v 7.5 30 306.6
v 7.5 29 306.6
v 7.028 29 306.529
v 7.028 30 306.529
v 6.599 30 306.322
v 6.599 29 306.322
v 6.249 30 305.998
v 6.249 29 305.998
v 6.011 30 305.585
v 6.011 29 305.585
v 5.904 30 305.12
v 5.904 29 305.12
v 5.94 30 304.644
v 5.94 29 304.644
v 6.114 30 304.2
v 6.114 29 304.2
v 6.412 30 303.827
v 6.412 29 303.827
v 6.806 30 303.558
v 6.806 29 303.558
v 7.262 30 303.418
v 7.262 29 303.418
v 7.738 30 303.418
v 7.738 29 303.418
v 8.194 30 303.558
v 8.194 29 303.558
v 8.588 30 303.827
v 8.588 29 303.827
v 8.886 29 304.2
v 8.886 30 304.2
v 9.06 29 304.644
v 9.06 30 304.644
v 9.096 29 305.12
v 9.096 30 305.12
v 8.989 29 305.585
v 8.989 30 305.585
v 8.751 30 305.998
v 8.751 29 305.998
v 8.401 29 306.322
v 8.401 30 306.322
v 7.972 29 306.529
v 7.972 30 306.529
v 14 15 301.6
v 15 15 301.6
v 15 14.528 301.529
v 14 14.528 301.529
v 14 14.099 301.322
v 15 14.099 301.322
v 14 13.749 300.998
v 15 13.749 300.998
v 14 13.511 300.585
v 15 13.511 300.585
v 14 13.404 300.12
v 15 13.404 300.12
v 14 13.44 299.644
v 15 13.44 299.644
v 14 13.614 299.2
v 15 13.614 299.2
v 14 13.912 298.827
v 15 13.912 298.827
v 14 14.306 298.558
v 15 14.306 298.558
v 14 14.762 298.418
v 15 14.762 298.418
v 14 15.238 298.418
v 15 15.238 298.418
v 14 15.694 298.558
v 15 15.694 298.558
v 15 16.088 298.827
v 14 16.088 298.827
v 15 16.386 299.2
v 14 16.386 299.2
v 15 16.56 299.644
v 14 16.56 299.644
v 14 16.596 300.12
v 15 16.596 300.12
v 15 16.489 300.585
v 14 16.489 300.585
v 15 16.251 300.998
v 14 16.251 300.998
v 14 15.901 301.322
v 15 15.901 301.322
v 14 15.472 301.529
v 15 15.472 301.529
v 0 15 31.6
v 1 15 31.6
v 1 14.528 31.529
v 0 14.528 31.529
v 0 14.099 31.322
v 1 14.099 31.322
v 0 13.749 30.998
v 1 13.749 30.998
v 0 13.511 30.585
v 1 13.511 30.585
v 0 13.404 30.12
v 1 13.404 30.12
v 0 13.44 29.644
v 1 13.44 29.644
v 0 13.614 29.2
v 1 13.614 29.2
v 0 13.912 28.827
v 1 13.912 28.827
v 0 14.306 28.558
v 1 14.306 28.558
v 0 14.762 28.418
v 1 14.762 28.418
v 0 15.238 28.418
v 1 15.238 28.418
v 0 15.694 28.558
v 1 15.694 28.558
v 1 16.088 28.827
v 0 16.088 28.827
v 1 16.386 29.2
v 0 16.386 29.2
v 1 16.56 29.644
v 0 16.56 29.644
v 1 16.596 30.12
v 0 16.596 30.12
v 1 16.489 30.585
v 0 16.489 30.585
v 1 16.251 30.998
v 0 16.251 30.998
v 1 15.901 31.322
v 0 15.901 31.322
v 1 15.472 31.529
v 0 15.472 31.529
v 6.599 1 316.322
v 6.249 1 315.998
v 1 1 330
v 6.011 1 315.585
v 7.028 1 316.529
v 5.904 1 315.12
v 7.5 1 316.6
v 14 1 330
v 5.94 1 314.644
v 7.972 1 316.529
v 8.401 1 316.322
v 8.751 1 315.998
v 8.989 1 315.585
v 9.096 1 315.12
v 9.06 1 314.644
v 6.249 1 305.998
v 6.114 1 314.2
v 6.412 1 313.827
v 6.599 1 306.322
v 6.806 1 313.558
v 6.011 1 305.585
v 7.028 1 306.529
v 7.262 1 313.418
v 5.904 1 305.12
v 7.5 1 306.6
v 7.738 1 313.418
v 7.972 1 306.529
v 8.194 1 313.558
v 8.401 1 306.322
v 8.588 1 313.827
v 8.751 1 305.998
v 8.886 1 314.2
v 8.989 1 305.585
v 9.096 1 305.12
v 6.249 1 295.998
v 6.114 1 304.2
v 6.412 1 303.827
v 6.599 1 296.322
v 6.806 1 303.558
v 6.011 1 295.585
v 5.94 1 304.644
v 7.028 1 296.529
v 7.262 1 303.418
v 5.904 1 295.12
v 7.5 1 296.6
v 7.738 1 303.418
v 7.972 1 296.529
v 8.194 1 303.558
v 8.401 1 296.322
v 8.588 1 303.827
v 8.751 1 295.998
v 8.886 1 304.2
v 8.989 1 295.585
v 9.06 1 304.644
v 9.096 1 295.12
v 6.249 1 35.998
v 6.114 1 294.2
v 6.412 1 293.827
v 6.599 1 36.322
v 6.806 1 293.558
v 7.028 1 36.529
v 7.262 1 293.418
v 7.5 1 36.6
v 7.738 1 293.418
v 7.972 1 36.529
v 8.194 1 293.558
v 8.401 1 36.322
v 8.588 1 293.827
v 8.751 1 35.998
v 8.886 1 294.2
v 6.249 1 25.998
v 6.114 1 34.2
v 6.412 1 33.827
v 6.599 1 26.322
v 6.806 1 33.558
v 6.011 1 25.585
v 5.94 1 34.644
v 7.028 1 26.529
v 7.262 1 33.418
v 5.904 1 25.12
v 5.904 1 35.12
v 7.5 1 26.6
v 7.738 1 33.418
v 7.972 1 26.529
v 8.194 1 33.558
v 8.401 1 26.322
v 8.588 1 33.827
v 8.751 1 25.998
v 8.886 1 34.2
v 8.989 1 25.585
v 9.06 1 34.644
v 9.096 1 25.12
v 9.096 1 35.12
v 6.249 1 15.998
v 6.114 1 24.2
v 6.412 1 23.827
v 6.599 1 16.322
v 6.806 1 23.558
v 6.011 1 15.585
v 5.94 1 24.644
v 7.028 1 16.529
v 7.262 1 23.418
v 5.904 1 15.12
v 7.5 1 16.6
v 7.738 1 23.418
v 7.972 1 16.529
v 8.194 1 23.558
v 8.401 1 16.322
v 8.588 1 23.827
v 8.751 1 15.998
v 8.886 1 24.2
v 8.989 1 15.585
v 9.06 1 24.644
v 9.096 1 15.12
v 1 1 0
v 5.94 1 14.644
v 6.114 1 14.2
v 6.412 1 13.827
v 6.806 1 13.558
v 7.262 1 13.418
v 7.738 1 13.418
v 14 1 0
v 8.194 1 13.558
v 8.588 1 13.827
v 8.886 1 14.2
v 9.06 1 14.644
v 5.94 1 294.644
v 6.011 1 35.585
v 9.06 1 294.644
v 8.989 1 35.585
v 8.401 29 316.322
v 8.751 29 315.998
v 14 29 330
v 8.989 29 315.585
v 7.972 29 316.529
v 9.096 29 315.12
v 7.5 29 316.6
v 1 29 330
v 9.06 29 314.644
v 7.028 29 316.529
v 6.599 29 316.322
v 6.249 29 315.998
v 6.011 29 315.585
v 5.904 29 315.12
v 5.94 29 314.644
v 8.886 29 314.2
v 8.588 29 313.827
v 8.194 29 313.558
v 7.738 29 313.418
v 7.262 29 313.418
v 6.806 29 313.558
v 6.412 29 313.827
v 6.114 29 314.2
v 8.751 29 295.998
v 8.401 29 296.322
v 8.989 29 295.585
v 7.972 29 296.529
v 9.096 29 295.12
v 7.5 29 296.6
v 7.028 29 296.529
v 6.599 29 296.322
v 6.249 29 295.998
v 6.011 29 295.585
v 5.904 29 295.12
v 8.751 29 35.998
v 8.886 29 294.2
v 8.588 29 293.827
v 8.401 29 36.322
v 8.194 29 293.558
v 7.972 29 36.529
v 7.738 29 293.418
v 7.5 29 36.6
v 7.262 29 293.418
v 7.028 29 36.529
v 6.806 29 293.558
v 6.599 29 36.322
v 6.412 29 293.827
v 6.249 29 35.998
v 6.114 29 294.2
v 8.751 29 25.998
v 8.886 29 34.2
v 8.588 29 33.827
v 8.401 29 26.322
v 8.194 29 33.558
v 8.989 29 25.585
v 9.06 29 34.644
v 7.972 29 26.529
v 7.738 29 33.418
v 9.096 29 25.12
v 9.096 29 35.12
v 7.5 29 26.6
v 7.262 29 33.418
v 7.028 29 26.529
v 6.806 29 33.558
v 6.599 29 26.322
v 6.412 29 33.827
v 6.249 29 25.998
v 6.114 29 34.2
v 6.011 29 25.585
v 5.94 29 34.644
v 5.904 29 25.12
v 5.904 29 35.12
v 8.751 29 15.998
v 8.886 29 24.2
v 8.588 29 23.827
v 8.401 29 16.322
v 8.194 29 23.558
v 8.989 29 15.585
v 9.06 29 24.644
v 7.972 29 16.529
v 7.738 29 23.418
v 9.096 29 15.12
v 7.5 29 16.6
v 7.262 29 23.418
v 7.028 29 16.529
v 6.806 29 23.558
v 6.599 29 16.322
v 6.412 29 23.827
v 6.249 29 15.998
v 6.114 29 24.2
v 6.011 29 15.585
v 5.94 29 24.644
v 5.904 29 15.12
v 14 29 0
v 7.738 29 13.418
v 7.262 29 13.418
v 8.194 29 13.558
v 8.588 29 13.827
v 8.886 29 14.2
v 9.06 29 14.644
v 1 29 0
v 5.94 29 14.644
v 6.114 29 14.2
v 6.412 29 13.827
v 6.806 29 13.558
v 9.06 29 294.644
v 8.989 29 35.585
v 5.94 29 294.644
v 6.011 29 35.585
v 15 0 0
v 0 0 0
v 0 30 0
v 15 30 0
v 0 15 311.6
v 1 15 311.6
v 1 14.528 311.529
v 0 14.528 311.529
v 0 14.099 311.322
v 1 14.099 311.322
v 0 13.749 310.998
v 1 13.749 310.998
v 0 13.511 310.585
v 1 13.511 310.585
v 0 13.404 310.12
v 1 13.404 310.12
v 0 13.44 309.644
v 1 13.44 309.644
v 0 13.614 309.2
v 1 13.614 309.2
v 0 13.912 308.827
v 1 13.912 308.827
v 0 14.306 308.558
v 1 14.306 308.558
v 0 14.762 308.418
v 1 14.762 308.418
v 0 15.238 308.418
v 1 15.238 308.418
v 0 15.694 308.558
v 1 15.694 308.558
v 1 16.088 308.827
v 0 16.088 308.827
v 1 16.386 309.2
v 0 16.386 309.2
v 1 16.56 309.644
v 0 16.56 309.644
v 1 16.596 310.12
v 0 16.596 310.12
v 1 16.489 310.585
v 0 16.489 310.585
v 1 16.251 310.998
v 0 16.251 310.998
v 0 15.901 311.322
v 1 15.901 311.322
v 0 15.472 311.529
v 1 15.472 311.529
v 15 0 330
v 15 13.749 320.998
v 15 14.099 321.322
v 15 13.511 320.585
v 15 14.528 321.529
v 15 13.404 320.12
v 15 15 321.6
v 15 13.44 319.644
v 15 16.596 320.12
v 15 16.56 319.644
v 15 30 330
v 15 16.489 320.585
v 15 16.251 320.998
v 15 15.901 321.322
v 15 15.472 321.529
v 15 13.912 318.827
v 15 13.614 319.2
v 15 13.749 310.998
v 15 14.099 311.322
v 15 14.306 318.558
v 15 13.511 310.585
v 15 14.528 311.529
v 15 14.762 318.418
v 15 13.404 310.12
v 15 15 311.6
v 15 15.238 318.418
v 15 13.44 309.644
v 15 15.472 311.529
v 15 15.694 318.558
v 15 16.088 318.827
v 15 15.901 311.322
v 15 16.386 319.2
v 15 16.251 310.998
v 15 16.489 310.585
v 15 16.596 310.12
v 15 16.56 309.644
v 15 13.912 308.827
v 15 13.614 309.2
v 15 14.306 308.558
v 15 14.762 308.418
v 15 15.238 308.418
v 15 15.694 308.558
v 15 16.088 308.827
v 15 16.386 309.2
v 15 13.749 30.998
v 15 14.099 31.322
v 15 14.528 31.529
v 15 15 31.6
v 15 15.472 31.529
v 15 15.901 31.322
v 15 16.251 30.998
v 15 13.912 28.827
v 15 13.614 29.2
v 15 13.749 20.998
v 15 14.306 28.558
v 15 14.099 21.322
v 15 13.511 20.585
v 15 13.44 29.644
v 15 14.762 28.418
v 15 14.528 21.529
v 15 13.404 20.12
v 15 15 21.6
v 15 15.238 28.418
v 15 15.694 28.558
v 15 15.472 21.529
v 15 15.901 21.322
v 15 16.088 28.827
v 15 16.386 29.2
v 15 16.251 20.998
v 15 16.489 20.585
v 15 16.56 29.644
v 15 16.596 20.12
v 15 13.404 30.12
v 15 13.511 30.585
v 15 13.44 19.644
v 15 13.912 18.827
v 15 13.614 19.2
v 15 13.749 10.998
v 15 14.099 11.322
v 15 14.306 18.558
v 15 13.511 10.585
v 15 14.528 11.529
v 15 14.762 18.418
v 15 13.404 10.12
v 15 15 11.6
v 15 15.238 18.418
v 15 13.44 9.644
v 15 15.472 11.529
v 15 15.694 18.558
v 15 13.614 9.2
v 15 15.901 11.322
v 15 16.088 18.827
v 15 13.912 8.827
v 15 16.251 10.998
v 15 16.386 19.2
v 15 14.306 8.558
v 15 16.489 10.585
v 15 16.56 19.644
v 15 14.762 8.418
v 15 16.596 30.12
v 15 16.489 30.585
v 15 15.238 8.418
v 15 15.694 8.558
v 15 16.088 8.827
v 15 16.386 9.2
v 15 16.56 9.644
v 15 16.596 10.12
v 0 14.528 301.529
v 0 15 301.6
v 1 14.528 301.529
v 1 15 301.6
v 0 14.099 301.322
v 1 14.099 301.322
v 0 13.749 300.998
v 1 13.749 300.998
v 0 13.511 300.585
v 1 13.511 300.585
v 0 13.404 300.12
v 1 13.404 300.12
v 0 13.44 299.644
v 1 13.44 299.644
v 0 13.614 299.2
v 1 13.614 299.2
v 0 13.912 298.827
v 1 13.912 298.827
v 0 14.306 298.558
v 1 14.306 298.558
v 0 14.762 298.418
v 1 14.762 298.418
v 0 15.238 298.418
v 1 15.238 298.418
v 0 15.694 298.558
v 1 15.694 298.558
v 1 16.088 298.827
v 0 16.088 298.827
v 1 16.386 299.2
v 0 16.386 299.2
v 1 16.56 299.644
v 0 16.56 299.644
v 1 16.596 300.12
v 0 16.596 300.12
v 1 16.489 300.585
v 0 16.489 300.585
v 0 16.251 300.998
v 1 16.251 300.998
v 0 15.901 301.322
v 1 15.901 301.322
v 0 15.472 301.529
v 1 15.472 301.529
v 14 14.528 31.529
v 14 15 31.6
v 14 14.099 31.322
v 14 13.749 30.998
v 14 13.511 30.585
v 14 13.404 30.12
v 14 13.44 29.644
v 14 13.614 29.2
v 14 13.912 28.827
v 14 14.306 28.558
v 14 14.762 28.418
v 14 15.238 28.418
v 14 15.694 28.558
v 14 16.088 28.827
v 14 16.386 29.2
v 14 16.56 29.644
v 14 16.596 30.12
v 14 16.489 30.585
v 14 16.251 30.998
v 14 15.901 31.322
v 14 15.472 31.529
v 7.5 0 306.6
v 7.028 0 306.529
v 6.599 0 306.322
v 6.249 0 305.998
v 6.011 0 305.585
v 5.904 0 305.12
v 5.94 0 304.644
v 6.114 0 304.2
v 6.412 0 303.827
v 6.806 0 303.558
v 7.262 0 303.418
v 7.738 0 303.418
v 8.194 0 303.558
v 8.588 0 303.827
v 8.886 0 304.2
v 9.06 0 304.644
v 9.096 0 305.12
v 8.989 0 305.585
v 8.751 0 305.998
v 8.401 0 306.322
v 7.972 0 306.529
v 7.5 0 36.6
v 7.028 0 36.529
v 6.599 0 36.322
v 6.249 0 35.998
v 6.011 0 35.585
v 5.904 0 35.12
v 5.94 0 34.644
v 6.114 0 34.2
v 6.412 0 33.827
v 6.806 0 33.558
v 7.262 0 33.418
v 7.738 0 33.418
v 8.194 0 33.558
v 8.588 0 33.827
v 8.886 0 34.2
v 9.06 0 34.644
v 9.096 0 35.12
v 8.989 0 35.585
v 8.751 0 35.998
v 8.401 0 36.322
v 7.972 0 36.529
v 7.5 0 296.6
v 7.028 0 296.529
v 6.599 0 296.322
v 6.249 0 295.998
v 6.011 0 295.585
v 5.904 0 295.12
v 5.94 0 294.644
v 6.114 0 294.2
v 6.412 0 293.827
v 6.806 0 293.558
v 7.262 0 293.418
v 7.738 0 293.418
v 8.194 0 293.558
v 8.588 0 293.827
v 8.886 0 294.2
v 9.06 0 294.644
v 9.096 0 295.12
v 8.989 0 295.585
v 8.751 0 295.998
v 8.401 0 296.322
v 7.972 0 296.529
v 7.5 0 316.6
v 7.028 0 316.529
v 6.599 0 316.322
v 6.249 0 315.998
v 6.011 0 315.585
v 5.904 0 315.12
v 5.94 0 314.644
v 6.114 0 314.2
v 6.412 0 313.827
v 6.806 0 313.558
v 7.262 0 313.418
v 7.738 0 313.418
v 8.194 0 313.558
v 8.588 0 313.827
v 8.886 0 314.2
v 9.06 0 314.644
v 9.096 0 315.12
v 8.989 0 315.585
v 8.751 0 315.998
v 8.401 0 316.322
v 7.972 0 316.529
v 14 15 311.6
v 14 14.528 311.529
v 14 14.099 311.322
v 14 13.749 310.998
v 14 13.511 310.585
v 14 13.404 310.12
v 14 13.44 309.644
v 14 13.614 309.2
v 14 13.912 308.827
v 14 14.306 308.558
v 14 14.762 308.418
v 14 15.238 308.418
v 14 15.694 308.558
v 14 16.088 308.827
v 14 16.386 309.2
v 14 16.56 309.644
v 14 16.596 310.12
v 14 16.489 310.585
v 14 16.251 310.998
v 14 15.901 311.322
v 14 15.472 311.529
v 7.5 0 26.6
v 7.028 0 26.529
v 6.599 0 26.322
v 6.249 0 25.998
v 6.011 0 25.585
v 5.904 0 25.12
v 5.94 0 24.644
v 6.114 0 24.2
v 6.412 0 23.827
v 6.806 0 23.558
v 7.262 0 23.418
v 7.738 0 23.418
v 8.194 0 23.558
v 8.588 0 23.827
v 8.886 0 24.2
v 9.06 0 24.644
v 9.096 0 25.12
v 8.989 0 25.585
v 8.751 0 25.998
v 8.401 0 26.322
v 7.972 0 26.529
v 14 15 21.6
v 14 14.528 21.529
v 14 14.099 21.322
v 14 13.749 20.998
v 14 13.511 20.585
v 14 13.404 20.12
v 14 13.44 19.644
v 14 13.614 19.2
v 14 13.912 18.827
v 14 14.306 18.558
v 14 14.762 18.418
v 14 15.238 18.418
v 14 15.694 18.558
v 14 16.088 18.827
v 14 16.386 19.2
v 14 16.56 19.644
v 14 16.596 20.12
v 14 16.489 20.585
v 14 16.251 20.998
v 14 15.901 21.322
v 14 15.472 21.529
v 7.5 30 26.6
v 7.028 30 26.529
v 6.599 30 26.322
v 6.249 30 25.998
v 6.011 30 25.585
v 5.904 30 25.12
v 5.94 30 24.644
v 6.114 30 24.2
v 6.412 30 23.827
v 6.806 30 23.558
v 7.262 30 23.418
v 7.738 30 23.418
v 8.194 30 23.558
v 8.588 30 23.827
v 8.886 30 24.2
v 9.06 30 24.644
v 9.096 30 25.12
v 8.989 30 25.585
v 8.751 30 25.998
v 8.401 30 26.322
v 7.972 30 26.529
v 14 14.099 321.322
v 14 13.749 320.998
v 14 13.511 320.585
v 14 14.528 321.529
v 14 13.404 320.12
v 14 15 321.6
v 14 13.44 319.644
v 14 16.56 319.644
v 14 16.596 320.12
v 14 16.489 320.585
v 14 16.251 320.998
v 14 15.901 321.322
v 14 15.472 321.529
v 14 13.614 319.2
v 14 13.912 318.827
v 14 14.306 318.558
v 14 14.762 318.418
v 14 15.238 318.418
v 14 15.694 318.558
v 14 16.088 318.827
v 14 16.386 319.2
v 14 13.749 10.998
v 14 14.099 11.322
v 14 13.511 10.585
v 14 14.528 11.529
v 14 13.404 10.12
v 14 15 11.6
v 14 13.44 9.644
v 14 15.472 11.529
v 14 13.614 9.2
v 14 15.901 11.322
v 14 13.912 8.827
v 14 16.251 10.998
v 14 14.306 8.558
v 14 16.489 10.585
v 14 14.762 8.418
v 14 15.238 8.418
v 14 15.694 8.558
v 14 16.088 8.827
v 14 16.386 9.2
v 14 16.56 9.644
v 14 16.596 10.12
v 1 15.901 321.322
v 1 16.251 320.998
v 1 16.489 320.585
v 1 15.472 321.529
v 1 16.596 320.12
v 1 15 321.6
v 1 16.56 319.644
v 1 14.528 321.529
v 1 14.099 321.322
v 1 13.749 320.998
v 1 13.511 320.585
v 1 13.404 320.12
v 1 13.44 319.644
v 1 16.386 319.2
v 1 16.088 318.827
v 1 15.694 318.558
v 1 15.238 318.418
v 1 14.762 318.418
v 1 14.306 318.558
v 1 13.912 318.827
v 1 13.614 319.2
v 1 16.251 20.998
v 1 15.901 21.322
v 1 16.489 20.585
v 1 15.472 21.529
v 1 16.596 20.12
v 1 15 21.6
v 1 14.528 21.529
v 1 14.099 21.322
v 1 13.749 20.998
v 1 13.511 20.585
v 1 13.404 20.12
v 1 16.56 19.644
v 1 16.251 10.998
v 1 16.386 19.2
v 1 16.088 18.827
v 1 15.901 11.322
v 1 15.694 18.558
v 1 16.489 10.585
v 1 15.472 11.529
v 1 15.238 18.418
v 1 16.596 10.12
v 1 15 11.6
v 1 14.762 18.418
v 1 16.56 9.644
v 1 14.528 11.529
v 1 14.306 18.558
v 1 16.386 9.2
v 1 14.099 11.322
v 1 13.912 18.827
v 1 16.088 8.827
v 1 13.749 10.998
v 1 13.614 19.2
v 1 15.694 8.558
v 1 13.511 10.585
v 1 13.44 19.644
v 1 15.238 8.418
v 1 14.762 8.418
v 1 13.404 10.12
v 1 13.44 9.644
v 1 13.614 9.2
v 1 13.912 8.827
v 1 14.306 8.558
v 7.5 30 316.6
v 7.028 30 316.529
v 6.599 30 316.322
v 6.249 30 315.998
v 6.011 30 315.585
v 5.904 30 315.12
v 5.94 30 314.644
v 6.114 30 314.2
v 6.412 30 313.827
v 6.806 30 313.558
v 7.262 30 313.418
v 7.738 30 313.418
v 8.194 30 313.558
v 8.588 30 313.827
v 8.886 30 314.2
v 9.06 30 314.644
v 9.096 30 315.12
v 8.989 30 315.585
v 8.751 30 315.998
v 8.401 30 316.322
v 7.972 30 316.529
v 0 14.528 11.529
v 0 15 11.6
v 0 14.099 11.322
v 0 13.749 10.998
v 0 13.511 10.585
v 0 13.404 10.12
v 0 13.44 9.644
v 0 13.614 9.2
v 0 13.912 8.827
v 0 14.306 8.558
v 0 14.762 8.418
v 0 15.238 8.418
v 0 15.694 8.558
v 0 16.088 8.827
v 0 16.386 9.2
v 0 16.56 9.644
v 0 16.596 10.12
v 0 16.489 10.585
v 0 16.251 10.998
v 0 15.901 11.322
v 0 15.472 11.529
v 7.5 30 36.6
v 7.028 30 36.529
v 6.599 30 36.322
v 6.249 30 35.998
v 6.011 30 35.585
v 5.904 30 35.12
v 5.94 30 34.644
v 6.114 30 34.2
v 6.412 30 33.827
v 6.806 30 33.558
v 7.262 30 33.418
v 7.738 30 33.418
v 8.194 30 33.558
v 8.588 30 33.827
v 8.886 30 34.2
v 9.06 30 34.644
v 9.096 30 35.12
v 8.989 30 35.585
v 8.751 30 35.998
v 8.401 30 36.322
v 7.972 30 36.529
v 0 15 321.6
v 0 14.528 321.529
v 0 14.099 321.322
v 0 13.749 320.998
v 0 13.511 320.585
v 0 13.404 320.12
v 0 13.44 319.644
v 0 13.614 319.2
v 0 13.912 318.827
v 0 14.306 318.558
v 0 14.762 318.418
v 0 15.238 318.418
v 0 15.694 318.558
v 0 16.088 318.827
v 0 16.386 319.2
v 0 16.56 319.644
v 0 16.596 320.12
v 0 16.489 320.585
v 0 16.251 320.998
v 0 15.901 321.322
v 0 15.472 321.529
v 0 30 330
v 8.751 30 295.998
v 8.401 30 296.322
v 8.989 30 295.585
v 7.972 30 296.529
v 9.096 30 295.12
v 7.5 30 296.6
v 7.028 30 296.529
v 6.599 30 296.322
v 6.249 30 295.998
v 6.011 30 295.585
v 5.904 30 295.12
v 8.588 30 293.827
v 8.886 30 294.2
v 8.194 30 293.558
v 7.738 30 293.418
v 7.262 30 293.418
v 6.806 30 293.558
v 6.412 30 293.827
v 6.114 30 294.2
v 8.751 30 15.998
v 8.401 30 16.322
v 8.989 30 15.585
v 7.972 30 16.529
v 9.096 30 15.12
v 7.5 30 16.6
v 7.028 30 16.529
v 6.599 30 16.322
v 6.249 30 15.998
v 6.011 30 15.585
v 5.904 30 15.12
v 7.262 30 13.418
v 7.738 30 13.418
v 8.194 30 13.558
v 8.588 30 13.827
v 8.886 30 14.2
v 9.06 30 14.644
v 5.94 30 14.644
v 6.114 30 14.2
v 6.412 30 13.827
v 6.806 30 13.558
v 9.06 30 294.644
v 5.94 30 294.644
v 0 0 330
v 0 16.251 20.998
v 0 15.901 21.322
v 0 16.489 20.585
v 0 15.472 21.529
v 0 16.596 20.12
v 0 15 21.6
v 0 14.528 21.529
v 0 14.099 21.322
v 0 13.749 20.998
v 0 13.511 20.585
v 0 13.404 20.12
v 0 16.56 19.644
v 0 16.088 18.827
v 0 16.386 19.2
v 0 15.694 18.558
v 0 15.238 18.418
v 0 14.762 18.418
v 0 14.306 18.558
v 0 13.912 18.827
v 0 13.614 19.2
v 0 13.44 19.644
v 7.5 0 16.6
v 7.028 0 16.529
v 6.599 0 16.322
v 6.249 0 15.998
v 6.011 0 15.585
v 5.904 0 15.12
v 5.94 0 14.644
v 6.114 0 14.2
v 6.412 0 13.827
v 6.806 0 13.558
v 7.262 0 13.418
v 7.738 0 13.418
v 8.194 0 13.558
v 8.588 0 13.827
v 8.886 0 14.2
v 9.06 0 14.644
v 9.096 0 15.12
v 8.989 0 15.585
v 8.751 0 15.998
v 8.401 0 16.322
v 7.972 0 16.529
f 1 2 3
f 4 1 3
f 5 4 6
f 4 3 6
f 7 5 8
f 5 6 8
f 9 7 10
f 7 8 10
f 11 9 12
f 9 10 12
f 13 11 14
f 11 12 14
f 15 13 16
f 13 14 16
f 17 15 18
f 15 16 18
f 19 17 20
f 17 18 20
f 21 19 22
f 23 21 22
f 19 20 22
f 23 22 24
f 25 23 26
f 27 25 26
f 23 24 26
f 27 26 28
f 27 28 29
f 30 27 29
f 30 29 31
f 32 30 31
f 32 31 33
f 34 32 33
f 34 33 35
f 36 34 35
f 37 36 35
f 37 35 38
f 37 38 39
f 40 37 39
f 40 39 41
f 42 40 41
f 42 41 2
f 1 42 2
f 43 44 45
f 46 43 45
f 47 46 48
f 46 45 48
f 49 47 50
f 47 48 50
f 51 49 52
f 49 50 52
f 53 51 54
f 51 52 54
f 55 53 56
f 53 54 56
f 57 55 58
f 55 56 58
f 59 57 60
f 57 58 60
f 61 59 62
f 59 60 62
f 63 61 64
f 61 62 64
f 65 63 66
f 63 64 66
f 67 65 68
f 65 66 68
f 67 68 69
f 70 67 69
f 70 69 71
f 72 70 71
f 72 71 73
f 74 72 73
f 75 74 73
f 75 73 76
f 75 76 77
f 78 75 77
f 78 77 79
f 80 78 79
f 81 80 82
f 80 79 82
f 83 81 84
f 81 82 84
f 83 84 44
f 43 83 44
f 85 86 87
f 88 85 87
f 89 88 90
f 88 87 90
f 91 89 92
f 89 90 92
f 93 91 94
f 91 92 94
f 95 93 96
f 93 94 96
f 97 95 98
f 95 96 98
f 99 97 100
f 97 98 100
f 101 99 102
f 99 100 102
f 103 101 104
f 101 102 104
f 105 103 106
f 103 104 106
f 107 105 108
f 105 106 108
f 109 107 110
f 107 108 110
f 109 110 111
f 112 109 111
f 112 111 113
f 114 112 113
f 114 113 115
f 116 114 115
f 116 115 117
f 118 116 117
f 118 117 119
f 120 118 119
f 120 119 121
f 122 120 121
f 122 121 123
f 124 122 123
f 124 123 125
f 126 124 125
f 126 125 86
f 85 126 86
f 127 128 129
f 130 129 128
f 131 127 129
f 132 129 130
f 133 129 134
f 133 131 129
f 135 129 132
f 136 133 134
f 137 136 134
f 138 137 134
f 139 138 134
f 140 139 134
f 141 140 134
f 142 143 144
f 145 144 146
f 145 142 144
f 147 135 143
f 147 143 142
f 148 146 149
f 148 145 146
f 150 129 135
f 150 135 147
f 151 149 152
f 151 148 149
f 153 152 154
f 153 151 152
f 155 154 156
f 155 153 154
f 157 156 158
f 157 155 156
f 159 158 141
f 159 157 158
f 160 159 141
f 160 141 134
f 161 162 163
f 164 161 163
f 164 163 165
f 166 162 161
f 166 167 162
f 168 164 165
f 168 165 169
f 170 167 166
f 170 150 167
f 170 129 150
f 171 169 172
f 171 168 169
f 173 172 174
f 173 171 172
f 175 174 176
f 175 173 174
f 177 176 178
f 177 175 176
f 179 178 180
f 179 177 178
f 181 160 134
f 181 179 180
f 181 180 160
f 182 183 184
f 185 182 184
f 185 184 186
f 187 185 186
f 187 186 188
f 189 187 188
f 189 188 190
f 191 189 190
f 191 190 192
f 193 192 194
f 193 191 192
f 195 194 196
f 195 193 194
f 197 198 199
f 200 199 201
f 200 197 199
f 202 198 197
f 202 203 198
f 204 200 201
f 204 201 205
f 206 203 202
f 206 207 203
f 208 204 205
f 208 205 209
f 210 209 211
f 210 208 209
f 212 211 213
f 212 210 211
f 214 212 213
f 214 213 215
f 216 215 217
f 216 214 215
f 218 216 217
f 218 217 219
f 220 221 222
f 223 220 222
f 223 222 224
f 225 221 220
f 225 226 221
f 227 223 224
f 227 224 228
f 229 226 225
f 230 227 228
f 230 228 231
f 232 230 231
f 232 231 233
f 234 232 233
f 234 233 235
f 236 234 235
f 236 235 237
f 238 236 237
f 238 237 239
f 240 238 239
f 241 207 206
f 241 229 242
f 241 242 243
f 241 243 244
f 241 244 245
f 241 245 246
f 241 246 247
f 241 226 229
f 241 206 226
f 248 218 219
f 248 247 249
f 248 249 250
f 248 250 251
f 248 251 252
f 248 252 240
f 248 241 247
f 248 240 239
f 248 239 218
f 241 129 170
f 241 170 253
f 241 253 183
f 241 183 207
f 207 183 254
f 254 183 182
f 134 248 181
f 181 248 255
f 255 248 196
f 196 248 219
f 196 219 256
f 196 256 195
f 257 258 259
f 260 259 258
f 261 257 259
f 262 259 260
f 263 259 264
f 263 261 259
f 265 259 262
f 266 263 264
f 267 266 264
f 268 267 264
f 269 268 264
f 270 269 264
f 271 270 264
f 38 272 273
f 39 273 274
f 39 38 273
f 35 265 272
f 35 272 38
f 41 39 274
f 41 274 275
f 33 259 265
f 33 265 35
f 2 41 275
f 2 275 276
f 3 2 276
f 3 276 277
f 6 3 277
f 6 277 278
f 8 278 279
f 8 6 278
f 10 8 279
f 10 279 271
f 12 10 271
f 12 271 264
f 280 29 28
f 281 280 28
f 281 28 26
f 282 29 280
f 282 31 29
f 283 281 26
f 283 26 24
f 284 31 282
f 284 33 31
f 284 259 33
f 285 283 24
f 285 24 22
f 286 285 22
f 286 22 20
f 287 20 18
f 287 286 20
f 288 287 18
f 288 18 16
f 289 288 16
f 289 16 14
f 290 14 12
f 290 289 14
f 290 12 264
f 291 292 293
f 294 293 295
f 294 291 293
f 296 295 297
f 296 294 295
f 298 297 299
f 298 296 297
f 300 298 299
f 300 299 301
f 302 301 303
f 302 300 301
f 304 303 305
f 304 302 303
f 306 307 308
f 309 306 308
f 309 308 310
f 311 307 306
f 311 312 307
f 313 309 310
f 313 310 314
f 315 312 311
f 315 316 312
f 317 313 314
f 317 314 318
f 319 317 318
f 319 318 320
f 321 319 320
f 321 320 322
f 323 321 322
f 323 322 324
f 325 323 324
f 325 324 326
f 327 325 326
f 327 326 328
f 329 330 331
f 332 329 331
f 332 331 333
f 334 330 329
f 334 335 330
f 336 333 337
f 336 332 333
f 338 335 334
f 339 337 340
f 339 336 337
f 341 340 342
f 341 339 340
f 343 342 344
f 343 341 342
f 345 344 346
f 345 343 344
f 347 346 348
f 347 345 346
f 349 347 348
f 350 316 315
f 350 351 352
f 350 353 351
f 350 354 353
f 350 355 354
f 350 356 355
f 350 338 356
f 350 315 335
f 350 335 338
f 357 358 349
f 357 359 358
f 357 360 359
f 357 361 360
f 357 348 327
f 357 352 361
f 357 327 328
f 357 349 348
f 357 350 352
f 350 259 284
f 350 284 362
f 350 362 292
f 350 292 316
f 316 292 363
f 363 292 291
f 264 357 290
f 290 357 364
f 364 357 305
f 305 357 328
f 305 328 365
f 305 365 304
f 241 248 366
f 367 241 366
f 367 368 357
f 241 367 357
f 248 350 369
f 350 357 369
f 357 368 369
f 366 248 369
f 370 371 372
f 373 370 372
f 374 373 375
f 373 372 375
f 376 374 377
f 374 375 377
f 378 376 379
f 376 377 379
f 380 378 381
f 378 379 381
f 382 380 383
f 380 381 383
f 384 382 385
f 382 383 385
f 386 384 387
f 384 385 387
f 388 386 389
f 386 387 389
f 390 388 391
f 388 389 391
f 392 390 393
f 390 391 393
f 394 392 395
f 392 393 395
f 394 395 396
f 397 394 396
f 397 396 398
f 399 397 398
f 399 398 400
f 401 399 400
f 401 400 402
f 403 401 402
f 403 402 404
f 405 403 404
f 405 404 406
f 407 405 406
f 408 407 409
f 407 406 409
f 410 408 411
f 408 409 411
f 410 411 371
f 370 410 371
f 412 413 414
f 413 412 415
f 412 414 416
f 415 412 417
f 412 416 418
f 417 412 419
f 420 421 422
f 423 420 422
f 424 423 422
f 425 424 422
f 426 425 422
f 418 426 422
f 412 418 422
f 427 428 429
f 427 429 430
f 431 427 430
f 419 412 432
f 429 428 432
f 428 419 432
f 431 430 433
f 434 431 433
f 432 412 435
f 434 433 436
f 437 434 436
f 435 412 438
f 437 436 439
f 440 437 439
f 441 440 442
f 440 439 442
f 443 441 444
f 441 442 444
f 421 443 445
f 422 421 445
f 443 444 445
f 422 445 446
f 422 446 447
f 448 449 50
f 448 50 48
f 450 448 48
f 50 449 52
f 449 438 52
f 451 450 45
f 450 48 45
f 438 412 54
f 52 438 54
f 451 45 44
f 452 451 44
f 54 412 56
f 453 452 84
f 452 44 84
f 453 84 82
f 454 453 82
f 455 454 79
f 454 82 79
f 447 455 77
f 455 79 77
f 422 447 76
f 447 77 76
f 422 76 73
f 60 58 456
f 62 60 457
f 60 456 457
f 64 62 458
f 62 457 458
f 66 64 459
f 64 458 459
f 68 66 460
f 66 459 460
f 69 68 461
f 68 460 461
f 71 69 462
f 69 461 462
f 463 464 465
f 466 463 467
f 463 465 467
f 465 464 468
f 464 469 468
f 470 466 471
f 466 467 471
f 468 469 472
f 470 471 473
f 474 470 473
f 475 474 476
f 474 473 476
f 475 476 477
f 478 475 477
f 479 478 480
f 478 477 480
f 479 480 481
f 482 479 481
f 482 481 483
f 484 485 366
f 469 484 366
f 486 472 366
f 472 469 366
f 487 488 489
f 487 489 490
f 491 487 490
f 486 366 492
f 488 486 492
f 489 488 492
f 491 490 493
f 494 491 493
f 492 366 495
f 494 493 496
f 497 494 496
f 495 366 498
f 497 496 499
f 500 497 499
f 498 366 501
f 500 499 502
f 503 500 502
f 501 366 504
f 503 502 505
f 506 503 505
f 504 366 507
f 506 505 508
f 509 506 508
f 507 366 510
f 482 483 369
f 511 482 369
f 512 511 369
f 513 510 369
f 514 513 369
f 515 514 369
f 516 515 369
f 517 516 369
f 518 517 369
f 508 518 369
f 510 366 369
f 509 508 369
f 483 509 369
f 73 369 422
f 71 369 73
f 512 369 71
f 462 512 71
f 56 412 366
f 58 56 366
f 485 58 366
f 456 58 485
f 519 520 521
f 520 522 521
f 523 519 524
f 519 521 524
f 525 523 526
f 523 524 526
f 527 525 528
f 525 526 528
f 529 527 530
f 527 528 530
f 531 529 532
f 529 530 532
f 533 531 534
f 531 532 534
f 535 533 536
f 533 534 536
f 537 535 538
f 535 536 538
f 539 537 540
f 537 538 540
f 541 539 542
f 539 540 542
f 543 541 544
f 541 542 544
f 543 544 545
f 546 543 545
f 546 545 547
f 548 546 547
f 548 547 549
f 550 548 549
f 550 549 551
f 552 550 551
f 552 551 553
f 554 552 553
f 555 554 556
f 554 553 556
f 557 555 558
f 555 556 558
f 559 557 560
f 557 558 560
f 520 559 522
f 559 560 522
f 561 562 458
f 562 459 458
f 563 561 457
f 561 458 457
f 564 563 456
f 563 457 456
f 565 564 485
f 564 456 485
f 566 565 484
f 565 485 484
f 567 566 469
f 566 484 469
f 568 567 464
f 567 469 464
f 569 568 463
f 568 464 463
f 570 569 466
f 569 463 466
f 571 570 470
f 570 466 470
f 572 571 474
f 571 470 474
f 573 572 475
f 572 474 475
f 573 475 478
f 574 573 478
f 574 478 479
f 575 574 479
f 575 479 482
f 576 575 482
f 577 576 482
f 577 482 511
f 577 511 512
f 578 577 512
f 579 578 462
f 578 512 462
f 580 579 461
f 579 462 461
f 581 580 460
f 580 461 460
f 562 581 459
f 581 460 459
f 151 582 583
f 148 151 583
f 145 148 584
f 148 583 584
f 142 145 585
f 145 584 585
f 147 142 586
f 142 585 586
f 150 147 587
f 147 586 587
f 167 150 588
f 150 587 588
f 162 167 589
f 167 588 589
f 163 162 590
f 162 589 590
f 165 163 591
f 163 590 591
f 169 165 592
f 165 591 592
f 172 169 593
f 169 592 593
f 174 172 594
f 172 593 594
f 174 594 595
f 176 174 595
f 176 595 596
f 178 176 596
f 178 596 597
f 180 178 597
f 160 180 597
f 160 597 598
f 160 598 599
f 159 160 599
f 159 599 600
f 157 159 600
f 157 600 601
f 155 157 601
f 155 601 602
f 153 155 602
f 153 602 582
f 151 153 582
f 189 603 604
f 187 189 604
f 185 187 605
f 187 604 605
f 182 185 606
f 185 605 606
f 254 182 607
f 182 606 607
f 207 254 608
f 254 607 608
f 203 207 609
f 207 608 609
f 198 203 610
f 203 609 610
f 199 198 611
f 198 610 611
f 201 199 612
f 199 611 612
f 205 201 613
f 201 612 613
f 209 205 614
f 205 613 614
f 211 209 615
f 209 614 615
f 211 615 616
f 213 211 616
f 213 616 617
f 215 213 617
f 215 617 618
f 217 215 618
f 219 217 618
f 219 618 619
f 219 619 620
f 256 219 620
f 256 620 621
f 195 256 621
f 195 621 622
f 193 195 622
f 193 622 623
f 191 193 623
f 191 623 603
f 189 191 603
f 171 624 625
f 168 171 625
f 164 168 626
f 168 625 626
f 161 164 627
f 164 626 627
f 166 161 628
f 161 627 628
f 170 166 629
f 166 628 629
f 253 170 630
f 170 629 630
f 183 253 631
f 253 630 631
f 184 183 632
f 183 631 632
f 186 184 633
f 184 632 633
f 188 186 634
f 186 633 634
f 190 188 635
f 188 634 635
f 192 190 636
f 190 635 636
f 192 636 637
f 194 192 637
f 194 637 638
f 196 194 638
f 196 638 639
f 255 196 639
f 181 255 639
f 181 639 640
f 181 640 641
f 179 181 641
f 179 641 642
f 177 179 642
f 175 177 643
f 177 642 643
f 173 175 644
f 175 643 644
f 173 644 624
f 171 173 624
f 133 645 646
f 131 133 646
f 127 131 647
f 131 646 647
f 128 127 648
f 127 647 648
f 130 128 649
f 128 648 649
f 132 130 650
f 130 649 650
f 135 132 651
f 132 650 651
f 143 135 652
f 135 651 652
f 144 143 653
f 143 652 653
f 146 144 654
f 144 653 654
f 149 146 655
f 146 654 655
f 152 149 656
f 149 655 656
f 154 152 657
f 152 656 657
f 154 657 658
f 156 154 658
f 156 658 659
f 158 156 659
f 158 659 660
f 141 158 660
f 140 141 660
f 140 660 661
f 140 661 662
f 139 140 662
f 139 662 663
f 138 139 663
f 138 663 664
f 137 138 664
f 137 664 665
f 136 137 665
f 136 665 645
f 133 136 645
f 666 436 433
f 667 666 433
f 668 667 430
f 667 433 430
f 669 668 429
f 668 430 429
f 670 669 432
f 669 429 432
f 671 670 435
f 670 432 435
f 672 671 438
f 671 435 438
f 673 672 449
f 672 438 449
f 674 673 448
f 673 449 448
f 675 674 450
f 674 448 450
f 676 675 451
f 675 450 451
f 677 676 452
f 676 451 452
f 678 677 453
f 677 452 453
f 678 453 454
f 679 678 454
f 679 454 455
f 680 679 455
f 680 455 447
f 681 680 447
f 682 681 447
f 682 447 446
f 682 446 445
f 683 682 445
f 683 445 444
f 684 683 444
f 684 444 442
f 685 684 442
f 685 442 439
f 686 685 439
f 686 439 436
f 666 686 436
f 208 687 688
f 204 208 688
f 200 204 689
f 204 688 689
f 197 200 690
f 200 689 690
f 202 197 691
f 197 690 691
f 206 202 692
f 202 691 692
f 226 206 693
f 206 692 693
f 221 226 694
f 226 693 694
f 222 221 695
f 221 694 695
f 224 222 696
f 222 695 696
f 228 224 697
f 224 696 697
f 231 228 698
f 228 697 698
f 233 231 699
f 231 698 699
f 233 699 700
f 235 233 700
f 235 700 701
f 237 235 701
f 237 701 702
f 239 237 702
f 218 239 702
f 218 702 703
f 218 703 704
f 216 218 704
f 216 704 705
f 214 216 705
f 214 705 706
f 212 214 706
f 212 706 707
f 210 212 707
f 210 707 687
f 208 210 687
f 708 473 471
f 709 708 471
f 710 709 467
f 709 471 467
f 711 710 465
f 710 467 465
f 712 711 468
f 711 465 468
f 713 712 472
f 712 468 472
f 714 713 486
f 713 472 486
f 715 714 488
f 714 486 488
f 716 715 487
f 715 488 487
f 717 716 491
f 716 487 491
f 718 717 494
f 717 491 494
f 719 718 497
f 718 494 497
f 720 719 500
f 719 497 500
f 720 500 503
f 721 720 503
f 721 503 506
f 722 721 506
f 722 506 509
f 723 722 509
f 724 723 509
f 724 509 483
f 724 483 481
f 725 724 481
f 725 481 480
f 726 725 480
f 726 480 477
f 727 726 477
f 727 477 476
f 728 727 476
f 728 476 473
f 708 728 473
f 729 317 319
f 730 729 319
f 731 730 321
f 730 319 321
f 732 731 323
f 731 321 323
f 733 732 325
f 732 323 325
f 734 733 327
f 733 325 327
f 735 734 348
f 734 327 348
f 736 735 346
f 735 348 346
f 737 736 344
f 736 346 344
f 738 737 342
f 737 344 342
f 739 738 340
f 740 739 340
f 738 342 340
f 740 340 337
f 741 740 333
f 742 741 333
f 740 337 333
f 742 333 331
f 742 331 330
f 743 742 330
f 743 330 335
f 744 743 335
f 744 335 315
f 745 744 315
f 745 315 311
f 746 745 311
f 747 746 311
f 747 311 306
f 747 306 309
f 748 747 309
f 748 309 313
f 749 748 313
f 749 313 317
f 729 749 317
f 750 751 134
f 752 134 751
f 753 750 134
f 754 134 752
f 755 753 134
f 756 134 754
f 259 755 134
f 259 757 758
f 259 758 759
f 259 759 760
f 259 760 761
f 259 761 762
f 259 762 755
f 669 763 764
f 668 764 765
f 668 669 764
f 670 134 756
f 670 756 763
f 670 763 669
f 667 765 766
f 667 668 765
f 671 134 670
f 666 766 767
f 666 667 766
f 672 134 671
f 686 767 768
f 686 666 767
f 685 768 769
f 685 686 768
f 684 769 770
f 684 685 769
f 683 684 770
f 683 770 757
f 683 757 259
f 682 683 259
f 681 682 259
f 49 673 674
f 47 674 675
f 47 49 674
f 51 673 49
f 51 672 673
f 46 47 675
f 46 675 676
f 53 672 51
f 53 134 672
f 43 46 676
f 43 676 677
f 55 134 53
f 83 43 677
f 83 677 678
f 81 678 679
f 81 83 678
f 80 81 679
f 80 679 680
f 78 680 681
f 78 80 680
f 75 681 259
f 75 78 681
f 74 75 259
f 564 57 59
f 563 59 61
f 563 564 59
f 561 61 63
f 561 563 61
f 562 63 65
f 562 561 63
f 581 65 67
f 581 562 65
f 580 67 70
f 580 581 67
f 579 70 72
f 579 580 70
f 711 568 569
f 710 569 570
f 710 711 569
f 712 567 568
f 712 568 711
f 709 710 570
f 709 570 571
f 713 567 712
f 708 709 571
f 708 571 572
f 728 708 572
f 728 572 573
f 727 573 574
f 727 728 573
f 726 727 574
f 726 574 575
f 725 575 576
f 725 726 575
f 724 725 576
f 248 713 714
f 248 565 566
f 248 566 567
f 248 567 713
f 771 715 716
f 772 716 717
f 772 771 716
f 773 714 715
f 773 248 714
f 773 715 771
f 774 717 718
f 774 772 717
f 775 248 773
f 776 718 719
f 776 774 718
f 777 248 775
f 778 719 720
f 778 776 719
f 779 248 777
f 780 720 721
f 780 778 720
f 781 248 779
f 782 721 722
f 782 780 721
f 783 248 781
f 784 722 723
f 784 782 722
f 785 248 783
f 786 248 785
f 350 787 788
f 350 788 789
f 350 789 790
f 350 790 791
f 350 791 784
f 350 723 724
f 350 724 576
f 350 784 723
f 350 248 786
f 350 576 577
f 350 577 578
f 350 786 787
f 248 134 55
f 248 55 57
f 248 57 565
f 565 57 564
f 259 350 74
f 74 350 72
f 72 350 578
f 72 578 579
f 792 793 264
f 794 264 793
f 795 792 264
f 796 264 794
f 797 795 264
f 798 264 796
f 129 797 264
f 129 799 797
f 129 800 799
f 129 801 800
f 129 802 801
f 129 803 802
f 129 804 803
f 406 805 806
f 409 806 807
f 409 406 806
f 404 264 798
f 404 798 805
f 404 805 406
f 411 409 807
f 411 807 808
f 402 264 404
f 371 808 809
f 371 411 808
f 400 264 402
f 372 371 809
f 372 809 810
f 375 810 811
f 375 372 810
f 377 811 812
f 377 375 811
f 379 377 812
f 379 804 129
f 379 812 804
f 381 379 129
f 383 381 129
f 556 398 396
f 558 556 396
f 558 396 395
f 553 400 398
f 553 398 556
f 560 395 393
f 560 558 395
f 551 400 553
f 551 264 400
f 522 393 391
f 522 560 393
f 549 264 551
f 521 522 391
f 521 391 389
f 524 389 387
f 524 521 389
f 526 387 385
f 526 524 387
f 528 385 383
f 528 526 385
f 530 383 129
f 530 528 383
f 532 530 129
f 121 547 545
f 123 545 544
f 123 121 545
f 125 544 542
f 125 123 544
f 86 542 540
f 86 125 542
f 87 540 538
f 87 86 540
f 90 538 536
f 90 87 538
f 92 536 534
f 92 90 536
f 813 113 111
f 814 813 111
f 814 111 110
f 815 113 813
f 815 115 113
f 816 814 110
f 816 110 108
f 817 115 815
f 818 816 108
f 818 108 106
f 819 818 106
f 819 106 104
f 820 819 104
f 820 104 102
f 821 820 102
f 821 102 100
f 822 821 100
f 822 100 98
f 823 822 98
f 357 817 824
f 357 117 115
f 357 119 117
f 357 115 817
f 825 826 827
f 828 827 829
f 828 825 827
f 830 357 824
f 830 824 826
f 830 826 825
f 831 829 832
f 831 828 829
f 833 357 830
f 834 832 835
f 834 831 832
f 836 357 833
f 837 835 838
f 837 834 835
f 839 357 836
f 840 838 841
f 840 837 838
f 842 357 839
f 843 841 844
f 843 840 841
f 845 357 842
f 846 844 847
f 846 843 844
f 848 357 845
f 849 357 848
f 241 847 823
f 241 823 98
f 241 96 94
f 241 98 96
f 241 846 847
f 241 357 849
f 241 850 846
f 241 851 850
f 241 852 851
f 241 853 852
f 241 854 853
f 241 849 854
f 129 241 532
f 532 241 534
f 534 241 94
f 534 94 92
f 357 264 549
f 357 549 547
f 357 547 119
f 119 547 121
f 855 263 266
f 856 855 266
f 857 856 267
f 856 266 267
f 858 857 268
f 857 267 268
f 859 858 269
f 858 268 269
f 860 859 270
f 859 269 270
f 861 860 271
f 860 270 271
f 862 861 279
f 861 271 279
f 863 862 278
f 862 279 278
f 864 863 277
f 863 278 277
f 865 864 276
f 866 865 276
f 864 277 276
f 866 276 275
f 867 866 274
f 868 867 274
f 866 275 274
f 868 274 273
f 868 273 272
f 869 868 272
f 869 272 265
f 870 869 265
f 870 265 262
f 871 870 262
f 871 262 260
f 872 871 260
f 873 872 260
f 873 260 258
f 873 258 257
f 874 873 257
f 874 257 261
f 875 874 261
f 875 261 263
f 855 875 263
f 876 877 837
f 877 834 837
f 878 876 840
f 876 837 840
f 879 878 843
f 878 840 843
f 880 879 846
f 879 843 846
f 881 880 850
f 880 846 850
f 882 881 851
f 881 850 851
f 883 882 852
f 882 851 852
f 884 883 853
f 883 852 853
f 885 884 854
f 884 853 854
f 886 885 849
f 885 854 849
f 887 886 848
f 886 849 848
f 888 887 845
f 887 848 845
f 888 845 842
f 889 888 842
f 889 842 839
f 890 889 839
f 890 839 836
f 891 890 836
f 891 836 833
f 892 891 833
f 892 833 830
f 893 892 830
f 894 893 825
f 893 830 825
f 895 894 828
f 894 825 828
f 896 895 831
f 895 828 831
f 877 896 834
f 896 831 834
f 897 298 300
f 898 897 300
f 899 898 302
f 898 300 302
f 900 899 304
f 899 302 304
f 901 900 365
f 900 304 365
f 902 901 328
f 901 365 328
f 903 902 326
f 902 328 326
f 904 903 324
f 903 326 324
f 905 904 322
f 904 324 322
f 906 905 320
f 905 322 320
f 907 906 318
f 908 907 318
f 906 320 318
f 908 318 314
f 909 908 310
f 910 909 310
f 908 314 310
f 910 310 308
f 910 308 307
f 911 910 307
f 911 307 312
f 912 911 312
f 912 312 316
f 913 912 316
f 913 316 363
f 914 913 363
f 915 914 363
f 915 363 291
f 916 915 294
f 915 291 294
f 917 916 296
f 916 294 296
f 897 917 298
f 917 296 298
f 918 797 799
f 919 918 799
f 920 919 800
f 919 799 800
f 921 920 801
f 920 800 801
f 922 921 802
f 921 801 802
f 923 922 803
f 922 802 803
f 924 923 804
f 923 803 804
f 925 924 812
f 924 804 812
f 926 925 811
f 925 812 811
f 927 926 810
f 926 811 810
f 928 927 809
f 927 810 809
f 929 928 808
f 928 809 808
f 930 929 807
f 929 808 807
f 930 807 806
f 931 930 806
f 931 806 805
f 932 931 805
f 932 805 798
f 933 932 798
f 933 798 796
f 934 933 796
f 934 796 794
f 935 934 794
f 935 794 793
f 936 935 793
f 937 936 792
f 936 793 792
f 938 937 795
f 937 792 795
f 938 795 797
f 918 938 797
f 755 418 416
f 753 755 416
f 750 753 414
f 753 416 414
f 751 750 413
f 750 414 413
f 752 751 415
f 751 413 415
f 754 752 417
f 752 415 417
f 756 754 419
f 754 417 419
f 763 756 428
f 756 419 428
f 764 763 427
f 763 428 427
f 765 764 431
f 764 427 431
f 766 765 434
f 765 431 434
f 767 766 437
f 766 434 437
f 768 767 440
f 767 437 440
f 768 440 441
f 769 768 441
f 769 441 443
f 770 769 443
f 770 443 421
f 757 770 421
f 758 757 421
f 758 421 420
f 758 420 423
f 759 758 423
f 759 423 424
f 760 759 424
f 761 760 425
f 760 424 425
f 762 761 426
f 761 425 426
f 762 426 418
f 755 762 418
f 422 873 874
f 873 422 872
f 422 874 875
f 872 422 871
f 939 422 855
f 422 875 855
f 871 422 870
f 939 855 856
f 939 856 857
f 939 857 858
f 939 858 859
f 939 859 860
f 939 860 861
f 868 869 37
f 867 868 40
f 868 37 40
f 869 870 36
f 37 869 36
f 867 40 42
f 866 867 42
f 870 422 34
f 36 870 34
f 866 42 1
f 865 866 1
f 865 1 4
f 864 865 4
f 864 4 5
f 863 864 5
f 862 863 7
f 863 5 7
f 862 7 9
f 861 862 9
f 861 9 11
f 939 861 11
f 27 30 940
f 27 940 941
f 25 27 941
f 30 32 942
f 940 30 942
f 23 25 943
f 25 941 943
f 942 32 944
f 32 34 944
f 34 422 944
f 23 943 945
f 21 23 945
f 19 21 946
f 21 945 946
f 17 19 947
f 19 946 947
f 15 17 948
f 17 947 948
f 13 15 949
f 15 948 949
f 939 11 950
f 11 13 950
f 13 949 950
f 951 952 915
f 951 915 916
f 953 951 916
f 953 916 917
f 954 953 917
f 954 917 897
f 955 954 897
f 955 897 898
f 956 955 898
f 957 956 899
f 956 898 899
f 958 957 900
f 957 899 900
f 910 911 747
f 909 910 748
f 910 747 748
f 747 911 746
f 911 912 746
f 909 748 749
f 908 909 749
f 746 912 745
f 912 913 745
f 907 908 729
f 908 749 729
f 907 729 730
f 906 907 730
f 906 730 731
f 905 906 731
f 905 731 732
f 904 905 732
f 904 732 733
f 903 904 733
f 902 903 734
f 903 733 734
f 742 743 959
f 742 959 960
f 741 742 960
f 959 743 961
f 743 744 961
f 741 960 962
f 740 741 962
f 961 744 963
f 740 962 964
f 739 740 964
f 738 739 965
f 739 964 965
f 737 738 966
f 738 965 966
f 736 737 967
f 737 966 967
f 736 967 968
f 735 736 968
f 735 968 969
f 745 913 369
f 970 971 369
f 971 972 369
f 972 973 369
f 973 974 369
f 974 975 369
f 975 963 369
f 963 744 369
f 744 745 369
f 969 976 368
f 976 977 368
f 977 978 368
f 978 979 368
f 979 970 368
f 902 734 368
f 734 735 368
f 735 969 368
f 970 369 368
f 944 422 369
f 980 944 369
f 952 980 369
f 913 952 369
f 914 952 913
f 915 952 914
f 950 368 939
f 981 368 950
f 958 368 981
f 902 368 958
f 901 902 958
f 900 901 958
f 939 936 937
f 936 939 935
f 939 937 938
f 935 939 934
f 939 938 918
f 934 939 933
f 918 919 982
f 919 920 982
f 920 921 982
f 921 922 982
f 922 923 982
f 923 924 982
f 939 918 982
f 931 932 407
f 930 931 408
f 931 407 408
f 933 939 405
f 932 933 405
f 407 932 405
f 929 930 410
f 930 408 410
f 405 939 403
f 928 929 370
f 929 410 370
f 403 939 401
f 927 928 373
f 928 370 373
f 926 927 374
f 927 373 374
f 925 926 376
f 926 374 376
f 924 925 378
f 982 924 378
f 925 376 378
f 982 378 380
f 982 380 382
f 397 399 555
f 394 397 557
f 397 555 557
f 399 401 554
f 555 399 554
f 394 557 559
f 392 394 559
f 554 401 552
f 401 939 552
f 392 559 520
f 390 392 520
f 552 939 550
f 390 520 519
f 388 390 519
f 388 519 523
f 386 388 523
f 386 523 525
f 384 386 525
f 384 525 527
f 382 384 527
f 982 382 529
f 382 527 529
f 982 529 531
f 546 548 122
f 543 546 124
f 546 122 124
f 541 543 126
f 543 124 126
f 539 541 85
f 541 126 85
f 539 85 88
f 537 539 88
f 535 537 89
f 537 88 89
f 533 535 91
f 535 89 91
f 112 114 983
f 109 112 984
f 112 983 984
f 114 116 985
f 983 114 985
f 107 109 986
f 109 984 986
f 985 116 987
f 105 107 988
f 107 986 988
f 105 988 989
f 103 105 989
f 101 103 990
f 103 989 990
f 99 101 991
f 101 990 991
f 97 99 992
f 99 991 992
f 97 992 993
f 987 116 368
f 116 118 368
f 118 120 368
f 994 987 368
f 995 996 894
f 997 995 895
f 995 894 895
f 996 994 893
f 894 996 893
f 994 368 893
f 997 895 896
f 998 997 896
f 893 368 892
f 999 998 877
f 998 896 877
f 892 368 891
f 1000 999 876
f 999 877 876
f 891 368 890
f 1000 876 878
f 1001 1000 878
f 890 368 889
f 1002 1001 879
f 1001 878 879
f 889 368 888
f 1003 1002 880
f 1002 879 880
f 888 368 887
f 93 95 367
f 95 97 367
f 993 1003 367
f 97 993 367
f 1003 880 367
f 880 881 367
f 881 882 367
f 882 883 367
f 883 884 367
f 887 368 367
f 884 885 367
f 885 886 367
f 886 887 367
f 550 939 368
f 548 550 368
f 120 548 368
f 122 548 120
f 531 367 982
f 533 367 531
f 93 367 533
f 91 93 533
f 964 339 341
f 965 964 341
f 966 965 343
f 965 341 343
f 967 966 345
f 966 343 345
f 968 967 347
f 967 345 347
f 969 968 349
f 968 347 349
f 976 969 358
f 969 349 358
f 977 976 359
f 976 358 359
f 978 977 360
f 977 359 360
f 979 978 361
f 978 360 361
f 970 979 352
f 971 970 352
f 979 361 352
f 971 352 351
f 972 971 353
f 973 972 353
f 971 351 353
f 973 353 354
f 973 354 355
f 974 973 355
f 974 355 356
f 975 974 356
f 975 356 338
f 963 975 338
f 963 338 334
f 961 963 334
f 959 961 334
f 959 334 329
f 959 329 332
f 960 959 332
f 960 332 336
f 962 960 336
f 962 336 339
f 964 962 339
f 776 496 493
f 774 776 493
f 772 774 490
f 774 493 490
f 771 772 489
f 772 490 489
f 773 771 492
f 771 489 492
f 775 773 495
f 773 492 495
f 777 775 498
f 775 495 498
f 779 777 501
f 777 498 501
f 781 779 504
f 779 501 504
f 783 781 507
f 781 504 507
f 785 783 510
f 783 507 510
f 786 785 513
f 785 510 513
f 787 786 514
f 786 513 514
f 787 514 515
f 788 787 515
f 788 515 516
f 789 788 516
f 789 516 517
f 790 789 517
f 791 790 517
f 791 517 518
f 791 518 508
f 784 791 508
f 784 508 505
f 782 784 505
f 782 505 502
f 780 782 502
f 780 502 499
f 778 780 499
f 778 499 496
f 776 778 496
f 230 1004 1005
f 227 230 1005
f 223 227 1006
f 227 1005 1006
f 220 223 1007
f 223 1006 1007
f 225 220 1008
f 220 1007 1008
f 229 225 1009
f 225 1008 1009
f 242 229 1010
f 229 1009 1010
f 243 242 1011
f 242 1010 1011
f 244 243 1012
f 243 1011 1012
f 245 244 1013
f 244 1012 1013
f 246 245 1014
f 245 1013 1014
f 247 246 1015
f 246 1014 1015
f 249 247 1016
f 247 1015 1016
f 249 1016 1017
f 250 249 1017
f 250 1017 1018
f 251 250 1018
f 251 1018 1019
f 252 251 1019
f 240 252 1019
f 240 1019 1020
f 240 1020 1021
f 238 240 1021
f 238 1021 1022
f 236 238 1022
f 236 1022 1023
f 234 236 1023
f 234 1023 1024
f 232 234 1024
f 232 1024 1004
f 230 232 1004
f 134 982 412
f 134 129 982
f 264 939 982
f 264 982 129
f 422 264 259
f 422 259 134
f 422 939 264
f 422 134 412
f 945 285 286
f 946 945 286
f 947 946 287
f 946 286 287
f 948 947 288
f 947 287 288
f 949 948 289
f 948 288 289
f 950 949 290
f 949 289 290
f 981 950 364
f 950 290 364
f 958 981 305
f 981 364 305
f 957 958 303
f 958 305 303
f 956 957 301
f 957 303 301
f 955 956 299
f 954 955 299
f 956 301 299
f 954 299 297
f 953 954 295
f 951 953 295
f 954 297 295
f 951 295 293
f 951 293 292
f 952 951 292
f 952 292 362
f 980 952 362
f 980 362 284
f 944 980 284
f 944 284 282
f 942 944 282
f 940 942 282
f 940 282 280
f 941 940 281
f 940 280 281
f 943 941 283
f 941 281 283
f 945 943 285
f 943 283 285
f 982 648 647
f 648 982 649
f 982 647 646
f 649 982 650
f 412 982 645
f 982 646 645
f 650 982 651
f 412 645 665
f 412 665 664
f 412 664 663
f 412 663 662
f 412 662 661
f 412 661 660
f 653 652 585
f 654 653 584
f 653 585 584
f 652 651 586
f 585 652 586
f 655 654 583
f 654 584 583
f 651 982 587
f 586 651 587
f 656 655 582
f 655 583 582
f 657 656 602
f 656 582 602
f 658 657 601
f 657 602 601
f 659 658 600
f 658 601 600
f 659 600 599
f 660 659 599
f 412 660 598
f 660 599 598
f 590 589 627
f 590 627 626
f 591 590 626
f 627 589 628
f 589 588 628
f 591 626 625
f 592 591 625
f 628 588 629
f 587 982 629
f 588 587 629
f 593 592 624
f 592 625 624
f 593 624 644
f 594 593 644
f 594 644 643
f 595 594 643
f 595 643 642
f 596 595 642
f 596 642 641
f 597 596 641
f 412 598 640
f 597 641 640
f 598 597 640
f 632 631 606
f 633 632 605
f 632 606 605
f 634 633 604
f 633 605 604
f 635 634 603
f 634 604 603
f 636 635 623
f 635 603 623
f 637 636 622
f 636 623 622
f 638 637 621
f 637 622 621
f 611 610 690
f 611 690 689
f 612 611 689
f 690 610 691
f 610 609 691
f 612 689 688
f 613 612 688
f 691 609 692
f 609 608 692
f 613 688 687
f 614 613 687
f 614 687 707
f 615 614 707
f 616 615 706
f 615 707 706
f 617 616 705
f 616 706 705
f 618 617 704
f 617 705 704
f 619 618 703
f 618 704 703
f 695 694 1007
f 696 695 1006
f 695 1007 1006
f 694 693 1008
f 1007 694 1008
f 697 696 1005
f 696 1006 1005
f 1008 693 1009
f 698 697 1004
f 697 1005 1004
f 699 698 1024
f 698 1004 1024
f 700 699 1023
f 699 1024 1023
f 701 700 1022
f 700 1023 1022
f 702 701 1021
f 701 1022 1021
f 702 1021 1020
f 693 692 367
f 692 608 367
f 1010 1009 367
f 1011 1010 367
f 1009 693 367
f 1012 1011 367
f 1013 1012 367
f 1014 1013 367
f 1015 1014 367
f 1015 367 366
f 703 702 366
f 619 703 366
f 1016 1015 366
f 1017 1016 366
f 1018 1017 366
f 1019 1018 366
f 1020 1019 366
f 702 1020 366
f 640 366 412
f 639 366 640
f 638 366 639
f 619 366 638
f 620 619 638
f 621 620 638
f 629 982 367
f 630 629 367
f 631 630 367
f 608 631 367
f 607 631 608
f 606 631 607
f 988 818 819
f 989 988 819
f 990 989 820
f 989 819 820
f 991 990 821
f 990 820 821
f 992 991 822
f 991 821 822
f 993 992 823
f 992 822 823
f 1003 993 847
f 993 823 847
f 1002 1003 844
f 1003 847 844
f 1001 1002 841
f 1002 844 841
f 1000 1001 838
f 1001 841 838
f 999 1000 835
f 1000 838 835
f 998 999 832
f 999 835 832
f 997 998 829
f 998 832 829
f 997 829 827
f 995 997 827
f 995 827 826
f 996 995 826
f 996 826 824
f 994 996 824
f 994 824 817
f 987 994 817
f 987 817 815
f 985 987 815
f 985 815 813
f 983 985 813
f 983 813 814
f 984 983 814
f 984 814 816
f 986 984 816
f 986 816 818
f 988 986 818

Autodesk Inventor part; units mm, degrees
ref_plane "YZ Plane" through (0, 0, 0) normal (1, 0, 0) x (0, 1, 0)
ref_plane "XZ Plane" through (0, 0, 0) normal (0, 1, 0) x (-1, 0, 0)
ref_plane "XY Plane" through (0, 0, 0) normal (0, 0, 1) x (1, 0, 0)
sketch "スケッチ1" plane through (0, 0, 0) normal (0, 0, 1) x (1, 0, 0)
  line L0 (0, 0) -> (15, 0)
  line L1 (15, 0) -> (15, 30)
  line L2 (15, 30) -> (0, 30)
  line L3 (0, 30) -> (0, 0)
  line L4 (1, 1) -> (14, 1)
  line L5 (14, 1) -> (14, 29)
  line L6 (14, 29) -> (1, 29)
  line L7 (1, 29) -> (1, 1)
  dimension "d0" = 15
  dimension "d1" = 30
  dimension "d2" = 13
  dimension "d3" = 28
  dimension "d4" = 1
  dimension "d5" = 1
extrude "押し出し1" add sketch "スケッチ1" along normal blind 330
sketch "スケッチ2" plane through (0, 30, 0) normal (0, 1, 0) x (1, 0, 0)
  circle A0 centre (7.5, -15) radius 1.6
  line L0 (0, 0) -> (0, -330) projected
  line L1 (15, 0) -> (0, 0) projected
  circle A1 centre (7.5, -25) radius 1.6
  circle A2 centre (7.5, -35) radius 1.6
  circle A3 centre (7.5, -315) radius 1.6
  line L2 (15, -330) -> (0, -330) projected
  circle A4 centre (7.5, -305) radius 1.6
  circle A5 centre (7.5, -295) radius 1.6
  dimension "d8" = 3.2
  dimension "d9" = 7.5
  dimension "d10" = 15
  dimension "d11" = 3.2
  dimension "d12" = 10
  dimension "d13" = 3.2
  dimension "d14" = 10
  dimension "d15" = 3.2
  dimension "d16" = 15
  dimension "d17" = 7.5
  dimension "d18" = 3.2
  dimension "d19" = 10
  dimension "d20" = 3.2
  dimension "d21" = 10
hole "穴1" at (7.5, 30, 315) at (7.5, 30, 305) at (7.5, 30, 295) at (7.5, 30, 15) at (7.5, 30, 25) at (7.5, 30, 35) direction (0, -1, 0) diameter 3.2 depth 30
sketch "スケッチ3" plane through (0, 0, 0) normal (-1, 0, 0) x (0, 0, 1)
  circle A0 centre (10, 15) radius 1.6
  line L0 (0, 0) -> (330, 0) projected
  line L1 (0, 30) -> (0, 0) projected
  circle A1 centre (20, 15) radius 1.6
  circle A2 centre (30, 15) radius 1.6
  circle A3 centre (320, 15) radius 1.6
  line L2 (330, 30) -> (330, 0) projected
  circle A4 centre (310, 15) radius 1.6
  circle A5 centre (300, 15) radius 1.6
  dimension "d29" = 3.2
  dimension "d30" = 15
  dimension "d31" = 10
  dimension "d32" = 3.2
  dimension "d33" = 3.2
  dimension "d34" = 10
  dimension "d35" = 10
  dimension "d36" = 3.2
  dimension "d37" = 15
  dimension "d38" = 10
  dimension "d39" = 3.2
  dimension "d40" = 3.2
  dimension "d41" = 10
  dimension "d42" = 10
  dimension "d43" = 15
  dimension "d44" = 15
  dimension "d45" = 15
  dimension "d46" = 15
hole "穴2" at (0, 15, 10) at (0, 15, 20) at (0, 15, 30) at (0, 15, 300) at (0, 15, 310) at (0, 15, 320) direction (1, 0, 0) diameter 3.2 depth 15
sketch "スケッチ4" plane through (0, 0, 0) normal (-1, 0, 0) x (0, 0, 1)
  line L0 (0, 22.5781) -> (0, 21.5781) construction
  line L1 (0, 1) -> (330, 1) projected
  line L2 (0, 22.5781) -> (1, 22.5781) construction
  line L3 (0, 30) -> (0, 0) projected
  dimension "d54" = 1
  dimension "d55" = 90
  dimension "d56" = 0
sketch "スケッチ5" plane through (0, 0, 0) normal (-1, 0, 0) x (0, 0, 1)
  point P0 (0, 0)
equation "\"BendRadius\" = Thickness"
equation "\"BendReliefWidth\" = Thickness"
equation "\"BendReliefDepth\" = 0.5 * Thickness"
equation "\"CornerReliefSize\" = 4 * Thickness"
equation "\"MinimumRemnant\" = 2 * Thickness"
equation "\"TransitionRadius\" = BendRadius"
equation "\"JacobiRadiusSize\" = BendRadius"
equation "\"GapSize\" = Thickness"
equation "\"Thickness\" = 0.5"
properties part number "nhk39"
